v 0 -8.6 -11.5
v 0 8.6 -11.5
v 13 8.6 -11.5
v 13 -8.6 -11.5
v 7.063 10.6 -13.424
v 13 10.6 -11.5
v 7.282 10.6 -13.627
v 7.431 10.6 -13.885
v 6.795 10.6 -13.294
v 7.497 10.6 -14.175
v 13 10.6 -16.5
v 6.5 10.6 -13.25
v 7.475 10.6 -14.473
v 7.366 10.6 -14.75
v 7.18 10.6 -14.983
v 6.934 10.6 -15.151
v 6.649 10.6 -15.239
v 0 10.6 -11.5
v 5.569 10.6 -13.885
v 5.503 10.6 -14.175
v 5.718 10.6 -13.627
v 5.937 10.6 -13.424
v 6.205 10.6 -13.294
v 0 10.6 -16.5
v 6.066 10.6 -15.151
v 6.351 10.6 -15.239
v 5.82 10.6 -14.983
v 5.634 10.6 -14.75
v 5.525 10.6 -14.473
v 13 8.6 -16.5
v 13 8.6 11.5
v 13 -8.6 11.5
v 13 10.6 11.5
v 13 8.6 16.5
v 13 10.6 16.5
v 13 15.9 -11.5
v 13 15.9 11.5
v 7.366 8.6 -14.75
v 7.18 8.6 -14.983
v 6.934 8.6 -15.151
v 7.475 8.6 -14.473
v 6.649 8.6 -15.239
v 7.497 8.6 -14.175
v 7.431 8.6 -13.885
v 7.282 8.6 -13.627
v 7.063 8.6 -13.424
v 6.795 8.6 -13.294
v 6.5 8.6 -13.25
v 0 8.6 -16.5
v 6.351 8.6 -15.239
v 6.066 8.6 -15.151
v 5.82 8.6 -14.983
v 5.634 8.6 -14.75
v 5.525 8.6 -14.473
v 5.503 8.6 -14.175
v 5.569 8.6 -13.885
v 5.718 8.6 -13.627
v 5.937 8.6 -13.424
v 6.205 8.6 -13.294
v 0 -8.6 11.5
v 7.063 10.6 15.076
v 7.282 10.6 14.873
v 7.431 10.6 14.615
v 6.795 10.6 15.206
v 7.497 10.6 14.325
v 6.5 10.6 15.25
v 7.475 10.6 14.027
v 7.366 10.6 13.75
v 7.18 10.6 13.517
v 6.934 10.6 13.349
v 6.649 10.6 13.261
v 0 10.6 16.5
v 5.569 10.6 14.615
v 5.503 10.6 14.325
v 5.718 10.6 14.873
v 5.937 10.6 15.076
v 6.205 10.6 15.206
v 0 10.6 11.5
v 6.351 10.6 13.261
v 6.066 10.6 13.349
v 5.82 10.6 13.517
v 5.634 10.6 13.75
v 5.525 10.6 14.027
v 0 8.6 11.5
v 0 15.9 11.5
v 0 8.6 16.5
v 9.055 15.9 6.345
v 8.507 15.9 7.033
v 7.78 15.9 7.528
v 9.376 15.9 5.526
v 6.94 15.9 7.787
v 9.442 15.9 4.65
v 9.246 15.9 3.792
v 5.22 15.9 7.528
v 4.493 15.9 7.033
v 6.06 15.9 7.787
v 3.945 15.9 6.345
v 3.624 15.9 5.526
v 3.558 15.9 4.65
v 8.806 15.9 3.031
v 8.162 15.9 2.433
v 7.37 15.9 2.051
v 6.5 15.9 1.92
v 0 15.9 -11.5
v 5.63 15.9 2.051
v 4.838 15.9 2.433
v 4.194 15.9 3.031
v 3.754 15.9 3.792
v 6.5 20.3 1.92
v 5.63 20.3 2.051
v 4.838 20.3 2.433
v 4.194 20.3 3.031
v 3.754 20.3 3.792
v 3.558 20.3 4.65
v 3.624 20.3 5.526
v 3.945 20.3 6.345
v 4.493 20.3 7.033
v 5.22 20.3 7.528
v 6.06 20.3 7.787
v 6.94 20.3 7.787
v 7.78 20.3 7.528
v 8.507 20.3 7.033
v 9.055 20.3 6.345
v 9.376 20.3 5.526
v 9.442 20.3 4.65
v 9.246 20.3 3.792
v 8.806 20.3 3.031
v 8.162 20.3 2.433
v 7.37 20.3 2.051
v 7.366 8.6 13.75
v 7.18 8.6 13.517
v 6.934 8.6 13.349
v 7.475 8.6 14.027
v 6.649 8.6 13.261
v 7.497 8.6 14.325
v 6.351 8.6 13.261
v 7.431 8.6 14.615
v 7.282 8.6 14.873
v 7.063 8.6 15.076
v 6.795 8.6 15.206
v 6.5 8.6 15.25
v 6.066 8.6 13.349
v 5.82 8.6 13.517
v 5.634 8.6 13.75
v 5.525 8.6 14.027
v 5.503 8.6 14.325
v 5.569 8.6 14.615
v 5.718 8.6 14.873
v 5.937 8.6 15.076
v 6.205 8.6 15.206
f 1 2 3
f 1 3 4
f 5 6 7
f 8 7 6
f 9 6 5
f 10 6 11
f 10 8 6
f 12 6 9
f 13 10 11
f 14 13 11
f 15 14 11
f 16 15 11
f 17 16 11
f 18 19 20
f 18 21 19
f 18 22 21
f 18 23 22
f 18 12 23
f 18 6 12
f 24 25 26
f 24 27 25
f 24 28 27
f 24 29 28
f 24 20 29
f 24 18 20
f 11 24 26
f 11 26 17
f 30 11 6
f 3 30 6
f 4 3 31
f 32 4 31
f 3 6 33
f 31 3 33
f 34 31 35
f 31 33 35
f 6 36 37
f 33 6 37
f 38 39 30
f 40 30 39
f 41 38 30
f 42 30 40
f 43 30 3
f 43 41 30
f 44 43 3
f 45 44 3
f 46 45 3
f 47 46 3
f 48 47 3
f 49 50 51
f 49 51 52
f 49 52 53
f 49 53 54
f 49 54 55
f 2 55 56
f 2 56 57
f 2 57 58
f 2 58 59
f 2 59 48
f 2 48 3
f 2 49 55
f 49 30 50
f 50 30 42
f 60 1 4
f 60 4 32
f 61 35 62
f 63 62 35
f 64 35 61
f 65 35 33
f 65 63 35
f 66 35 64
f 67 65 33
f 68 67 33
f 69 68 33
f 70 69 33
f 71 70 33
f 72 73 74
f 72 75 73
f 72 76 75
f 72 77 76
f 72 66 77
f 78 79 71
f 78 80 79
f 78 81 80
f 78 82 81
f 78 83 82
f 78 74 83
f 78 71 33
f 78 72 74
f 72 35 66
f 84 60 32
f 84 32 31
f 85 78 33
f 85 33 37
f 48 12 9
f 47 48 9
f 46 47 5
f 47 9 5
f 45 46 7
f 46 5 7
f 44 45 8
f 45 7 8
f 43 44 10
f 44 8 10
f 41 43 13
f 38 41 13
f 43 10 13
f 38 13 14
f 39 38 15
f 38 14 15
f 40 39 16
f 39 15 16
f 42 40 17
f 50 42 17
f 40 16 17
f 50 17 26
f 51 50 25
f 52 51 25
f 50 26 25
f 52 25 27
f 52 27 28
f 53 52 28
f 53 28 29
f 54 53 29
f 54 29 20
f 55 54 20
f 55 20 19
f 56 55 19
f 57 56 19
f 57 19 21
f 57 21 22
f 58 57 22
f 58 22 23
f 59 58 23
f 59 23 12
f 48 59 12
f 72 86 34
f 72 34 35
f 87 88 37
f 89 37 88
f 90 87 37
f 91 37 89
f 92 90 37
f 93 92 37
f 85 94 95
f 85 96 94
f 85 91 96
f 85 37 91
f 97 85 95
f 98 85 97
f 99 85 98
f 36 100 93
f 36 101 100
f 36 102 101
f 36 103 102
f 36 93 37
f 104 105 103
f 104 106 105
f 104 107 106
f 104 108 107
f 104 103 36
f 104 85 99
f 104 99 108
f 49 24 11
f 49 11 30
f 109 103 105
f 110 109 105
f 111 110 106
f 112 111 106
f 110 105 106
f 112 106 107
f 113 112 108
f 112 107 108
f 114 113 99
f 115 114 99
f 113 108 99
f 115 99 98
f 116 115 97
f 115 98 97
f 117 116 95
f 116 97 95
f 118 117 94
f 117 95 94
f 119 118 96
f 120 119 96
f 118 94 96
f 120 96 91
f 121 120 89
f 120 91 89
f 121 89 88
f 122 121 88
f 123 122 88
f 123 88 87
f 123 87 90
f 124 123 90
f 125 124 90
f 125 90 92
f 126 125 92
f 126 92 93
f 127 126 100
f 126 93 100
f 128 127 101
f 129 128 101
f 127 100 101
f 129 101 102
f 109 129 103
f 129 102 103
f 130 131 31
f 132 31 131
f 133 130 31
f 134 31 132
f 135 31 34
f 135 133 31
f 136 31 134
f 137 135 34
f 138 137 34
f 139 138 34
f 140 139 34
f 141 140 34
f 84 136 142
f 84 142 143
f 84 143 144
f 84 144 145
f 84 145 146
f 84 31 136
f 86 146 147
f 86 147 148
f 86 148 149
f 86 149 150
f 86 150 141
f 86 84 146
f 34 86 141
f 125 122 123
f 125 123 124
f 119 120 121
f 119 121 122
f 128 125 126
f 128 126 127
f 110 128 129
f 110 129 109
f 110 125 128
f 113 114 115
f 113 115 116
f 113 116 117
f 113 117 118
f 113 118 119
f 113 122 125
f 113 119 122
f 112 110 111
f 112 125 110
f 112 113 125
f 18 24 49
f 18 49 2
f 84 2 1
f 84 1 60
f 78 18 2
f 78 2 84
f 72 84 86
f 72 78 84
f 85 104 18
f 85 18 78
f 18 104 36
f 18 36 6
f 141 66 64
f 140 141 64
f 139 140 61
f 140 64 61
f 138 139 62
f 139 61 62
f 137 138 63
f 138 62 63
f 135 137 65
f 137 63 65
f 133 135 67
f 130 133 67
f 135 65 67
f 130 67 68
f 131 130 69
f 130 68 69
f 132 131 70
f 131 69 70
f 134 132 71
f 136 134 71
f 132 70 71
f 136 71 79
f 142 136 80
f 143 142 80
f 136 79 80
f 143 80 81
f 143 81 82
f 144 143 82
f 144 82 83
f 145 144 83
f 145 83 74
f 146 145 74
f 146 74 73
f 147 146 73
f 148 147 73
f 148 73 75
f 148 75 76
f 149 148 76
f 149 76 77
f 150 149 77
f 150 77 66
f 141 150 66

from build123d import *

# Parameters (mm, degrees)
EXTRUDE_1_DEPTH     = 13
SKETCH_4_R          = 1
CUT_EXTRUDE_1_DEPTH = 29.458566373
SKETCH_6_R          = 2.95
EXTRUDE_2_DEPTH     = 4.4


with BuildPart() as part:
    # 草圖1 → 填料-伸長1 (new body)
    with BuildSketch(Plane(origin=(0, 0, 0), x_dir=(0, 0, -1), z_dir=(1, 0, 0))):
        Polygon((11.5, 10.6), (16.5, 10.6), (16.5, 8.6), (11.5, 8.6), (11.5, -8.6), (-11.5, -8.6), (-11.5, 8.6), (-16.5, 8.6), (-16.5, 10.6), (-11.5, 10.6), (-11.5, 15.9), (11.5, 15.9), align=None)
    extrude(amount=EXTRUDE_1_DEPTH)

    # 草圖4 → 除料-伸長1 (cut, through all)
    with BuildSketch(Plane(origin=(0, 10.6, 0), x_dir=(1, 0, 0), z_dir=(0, 1, 0))):
        with Locations(Location((6.5, 14.25, 0), (0, 0, 270))):
            Circle(SKETCH_4_R)
        with Locations(Location((6.5, -14.25, 0), (0, 0, 270))):
            Circle(SKETCH_4_R)
    extrude(amount=-CUT_EXTRUDE_1_DEPTH, mode=Mode.SUBTRACT)

    # 草圖6 → 填料-伸長2 (add)
    with BuildSketch(Plane(origin=(0, 15.9, 0), x_dir=(1, 0, 0), z_dir=(0, 1, 0))):
        with Locations(Location((6.5, -4.87, 0), (0, 0, 90))):
            Circle(SKETCH_6_R)
    extrude(amount=EXTRUDE_2_DEPTH)


solid = part.part
